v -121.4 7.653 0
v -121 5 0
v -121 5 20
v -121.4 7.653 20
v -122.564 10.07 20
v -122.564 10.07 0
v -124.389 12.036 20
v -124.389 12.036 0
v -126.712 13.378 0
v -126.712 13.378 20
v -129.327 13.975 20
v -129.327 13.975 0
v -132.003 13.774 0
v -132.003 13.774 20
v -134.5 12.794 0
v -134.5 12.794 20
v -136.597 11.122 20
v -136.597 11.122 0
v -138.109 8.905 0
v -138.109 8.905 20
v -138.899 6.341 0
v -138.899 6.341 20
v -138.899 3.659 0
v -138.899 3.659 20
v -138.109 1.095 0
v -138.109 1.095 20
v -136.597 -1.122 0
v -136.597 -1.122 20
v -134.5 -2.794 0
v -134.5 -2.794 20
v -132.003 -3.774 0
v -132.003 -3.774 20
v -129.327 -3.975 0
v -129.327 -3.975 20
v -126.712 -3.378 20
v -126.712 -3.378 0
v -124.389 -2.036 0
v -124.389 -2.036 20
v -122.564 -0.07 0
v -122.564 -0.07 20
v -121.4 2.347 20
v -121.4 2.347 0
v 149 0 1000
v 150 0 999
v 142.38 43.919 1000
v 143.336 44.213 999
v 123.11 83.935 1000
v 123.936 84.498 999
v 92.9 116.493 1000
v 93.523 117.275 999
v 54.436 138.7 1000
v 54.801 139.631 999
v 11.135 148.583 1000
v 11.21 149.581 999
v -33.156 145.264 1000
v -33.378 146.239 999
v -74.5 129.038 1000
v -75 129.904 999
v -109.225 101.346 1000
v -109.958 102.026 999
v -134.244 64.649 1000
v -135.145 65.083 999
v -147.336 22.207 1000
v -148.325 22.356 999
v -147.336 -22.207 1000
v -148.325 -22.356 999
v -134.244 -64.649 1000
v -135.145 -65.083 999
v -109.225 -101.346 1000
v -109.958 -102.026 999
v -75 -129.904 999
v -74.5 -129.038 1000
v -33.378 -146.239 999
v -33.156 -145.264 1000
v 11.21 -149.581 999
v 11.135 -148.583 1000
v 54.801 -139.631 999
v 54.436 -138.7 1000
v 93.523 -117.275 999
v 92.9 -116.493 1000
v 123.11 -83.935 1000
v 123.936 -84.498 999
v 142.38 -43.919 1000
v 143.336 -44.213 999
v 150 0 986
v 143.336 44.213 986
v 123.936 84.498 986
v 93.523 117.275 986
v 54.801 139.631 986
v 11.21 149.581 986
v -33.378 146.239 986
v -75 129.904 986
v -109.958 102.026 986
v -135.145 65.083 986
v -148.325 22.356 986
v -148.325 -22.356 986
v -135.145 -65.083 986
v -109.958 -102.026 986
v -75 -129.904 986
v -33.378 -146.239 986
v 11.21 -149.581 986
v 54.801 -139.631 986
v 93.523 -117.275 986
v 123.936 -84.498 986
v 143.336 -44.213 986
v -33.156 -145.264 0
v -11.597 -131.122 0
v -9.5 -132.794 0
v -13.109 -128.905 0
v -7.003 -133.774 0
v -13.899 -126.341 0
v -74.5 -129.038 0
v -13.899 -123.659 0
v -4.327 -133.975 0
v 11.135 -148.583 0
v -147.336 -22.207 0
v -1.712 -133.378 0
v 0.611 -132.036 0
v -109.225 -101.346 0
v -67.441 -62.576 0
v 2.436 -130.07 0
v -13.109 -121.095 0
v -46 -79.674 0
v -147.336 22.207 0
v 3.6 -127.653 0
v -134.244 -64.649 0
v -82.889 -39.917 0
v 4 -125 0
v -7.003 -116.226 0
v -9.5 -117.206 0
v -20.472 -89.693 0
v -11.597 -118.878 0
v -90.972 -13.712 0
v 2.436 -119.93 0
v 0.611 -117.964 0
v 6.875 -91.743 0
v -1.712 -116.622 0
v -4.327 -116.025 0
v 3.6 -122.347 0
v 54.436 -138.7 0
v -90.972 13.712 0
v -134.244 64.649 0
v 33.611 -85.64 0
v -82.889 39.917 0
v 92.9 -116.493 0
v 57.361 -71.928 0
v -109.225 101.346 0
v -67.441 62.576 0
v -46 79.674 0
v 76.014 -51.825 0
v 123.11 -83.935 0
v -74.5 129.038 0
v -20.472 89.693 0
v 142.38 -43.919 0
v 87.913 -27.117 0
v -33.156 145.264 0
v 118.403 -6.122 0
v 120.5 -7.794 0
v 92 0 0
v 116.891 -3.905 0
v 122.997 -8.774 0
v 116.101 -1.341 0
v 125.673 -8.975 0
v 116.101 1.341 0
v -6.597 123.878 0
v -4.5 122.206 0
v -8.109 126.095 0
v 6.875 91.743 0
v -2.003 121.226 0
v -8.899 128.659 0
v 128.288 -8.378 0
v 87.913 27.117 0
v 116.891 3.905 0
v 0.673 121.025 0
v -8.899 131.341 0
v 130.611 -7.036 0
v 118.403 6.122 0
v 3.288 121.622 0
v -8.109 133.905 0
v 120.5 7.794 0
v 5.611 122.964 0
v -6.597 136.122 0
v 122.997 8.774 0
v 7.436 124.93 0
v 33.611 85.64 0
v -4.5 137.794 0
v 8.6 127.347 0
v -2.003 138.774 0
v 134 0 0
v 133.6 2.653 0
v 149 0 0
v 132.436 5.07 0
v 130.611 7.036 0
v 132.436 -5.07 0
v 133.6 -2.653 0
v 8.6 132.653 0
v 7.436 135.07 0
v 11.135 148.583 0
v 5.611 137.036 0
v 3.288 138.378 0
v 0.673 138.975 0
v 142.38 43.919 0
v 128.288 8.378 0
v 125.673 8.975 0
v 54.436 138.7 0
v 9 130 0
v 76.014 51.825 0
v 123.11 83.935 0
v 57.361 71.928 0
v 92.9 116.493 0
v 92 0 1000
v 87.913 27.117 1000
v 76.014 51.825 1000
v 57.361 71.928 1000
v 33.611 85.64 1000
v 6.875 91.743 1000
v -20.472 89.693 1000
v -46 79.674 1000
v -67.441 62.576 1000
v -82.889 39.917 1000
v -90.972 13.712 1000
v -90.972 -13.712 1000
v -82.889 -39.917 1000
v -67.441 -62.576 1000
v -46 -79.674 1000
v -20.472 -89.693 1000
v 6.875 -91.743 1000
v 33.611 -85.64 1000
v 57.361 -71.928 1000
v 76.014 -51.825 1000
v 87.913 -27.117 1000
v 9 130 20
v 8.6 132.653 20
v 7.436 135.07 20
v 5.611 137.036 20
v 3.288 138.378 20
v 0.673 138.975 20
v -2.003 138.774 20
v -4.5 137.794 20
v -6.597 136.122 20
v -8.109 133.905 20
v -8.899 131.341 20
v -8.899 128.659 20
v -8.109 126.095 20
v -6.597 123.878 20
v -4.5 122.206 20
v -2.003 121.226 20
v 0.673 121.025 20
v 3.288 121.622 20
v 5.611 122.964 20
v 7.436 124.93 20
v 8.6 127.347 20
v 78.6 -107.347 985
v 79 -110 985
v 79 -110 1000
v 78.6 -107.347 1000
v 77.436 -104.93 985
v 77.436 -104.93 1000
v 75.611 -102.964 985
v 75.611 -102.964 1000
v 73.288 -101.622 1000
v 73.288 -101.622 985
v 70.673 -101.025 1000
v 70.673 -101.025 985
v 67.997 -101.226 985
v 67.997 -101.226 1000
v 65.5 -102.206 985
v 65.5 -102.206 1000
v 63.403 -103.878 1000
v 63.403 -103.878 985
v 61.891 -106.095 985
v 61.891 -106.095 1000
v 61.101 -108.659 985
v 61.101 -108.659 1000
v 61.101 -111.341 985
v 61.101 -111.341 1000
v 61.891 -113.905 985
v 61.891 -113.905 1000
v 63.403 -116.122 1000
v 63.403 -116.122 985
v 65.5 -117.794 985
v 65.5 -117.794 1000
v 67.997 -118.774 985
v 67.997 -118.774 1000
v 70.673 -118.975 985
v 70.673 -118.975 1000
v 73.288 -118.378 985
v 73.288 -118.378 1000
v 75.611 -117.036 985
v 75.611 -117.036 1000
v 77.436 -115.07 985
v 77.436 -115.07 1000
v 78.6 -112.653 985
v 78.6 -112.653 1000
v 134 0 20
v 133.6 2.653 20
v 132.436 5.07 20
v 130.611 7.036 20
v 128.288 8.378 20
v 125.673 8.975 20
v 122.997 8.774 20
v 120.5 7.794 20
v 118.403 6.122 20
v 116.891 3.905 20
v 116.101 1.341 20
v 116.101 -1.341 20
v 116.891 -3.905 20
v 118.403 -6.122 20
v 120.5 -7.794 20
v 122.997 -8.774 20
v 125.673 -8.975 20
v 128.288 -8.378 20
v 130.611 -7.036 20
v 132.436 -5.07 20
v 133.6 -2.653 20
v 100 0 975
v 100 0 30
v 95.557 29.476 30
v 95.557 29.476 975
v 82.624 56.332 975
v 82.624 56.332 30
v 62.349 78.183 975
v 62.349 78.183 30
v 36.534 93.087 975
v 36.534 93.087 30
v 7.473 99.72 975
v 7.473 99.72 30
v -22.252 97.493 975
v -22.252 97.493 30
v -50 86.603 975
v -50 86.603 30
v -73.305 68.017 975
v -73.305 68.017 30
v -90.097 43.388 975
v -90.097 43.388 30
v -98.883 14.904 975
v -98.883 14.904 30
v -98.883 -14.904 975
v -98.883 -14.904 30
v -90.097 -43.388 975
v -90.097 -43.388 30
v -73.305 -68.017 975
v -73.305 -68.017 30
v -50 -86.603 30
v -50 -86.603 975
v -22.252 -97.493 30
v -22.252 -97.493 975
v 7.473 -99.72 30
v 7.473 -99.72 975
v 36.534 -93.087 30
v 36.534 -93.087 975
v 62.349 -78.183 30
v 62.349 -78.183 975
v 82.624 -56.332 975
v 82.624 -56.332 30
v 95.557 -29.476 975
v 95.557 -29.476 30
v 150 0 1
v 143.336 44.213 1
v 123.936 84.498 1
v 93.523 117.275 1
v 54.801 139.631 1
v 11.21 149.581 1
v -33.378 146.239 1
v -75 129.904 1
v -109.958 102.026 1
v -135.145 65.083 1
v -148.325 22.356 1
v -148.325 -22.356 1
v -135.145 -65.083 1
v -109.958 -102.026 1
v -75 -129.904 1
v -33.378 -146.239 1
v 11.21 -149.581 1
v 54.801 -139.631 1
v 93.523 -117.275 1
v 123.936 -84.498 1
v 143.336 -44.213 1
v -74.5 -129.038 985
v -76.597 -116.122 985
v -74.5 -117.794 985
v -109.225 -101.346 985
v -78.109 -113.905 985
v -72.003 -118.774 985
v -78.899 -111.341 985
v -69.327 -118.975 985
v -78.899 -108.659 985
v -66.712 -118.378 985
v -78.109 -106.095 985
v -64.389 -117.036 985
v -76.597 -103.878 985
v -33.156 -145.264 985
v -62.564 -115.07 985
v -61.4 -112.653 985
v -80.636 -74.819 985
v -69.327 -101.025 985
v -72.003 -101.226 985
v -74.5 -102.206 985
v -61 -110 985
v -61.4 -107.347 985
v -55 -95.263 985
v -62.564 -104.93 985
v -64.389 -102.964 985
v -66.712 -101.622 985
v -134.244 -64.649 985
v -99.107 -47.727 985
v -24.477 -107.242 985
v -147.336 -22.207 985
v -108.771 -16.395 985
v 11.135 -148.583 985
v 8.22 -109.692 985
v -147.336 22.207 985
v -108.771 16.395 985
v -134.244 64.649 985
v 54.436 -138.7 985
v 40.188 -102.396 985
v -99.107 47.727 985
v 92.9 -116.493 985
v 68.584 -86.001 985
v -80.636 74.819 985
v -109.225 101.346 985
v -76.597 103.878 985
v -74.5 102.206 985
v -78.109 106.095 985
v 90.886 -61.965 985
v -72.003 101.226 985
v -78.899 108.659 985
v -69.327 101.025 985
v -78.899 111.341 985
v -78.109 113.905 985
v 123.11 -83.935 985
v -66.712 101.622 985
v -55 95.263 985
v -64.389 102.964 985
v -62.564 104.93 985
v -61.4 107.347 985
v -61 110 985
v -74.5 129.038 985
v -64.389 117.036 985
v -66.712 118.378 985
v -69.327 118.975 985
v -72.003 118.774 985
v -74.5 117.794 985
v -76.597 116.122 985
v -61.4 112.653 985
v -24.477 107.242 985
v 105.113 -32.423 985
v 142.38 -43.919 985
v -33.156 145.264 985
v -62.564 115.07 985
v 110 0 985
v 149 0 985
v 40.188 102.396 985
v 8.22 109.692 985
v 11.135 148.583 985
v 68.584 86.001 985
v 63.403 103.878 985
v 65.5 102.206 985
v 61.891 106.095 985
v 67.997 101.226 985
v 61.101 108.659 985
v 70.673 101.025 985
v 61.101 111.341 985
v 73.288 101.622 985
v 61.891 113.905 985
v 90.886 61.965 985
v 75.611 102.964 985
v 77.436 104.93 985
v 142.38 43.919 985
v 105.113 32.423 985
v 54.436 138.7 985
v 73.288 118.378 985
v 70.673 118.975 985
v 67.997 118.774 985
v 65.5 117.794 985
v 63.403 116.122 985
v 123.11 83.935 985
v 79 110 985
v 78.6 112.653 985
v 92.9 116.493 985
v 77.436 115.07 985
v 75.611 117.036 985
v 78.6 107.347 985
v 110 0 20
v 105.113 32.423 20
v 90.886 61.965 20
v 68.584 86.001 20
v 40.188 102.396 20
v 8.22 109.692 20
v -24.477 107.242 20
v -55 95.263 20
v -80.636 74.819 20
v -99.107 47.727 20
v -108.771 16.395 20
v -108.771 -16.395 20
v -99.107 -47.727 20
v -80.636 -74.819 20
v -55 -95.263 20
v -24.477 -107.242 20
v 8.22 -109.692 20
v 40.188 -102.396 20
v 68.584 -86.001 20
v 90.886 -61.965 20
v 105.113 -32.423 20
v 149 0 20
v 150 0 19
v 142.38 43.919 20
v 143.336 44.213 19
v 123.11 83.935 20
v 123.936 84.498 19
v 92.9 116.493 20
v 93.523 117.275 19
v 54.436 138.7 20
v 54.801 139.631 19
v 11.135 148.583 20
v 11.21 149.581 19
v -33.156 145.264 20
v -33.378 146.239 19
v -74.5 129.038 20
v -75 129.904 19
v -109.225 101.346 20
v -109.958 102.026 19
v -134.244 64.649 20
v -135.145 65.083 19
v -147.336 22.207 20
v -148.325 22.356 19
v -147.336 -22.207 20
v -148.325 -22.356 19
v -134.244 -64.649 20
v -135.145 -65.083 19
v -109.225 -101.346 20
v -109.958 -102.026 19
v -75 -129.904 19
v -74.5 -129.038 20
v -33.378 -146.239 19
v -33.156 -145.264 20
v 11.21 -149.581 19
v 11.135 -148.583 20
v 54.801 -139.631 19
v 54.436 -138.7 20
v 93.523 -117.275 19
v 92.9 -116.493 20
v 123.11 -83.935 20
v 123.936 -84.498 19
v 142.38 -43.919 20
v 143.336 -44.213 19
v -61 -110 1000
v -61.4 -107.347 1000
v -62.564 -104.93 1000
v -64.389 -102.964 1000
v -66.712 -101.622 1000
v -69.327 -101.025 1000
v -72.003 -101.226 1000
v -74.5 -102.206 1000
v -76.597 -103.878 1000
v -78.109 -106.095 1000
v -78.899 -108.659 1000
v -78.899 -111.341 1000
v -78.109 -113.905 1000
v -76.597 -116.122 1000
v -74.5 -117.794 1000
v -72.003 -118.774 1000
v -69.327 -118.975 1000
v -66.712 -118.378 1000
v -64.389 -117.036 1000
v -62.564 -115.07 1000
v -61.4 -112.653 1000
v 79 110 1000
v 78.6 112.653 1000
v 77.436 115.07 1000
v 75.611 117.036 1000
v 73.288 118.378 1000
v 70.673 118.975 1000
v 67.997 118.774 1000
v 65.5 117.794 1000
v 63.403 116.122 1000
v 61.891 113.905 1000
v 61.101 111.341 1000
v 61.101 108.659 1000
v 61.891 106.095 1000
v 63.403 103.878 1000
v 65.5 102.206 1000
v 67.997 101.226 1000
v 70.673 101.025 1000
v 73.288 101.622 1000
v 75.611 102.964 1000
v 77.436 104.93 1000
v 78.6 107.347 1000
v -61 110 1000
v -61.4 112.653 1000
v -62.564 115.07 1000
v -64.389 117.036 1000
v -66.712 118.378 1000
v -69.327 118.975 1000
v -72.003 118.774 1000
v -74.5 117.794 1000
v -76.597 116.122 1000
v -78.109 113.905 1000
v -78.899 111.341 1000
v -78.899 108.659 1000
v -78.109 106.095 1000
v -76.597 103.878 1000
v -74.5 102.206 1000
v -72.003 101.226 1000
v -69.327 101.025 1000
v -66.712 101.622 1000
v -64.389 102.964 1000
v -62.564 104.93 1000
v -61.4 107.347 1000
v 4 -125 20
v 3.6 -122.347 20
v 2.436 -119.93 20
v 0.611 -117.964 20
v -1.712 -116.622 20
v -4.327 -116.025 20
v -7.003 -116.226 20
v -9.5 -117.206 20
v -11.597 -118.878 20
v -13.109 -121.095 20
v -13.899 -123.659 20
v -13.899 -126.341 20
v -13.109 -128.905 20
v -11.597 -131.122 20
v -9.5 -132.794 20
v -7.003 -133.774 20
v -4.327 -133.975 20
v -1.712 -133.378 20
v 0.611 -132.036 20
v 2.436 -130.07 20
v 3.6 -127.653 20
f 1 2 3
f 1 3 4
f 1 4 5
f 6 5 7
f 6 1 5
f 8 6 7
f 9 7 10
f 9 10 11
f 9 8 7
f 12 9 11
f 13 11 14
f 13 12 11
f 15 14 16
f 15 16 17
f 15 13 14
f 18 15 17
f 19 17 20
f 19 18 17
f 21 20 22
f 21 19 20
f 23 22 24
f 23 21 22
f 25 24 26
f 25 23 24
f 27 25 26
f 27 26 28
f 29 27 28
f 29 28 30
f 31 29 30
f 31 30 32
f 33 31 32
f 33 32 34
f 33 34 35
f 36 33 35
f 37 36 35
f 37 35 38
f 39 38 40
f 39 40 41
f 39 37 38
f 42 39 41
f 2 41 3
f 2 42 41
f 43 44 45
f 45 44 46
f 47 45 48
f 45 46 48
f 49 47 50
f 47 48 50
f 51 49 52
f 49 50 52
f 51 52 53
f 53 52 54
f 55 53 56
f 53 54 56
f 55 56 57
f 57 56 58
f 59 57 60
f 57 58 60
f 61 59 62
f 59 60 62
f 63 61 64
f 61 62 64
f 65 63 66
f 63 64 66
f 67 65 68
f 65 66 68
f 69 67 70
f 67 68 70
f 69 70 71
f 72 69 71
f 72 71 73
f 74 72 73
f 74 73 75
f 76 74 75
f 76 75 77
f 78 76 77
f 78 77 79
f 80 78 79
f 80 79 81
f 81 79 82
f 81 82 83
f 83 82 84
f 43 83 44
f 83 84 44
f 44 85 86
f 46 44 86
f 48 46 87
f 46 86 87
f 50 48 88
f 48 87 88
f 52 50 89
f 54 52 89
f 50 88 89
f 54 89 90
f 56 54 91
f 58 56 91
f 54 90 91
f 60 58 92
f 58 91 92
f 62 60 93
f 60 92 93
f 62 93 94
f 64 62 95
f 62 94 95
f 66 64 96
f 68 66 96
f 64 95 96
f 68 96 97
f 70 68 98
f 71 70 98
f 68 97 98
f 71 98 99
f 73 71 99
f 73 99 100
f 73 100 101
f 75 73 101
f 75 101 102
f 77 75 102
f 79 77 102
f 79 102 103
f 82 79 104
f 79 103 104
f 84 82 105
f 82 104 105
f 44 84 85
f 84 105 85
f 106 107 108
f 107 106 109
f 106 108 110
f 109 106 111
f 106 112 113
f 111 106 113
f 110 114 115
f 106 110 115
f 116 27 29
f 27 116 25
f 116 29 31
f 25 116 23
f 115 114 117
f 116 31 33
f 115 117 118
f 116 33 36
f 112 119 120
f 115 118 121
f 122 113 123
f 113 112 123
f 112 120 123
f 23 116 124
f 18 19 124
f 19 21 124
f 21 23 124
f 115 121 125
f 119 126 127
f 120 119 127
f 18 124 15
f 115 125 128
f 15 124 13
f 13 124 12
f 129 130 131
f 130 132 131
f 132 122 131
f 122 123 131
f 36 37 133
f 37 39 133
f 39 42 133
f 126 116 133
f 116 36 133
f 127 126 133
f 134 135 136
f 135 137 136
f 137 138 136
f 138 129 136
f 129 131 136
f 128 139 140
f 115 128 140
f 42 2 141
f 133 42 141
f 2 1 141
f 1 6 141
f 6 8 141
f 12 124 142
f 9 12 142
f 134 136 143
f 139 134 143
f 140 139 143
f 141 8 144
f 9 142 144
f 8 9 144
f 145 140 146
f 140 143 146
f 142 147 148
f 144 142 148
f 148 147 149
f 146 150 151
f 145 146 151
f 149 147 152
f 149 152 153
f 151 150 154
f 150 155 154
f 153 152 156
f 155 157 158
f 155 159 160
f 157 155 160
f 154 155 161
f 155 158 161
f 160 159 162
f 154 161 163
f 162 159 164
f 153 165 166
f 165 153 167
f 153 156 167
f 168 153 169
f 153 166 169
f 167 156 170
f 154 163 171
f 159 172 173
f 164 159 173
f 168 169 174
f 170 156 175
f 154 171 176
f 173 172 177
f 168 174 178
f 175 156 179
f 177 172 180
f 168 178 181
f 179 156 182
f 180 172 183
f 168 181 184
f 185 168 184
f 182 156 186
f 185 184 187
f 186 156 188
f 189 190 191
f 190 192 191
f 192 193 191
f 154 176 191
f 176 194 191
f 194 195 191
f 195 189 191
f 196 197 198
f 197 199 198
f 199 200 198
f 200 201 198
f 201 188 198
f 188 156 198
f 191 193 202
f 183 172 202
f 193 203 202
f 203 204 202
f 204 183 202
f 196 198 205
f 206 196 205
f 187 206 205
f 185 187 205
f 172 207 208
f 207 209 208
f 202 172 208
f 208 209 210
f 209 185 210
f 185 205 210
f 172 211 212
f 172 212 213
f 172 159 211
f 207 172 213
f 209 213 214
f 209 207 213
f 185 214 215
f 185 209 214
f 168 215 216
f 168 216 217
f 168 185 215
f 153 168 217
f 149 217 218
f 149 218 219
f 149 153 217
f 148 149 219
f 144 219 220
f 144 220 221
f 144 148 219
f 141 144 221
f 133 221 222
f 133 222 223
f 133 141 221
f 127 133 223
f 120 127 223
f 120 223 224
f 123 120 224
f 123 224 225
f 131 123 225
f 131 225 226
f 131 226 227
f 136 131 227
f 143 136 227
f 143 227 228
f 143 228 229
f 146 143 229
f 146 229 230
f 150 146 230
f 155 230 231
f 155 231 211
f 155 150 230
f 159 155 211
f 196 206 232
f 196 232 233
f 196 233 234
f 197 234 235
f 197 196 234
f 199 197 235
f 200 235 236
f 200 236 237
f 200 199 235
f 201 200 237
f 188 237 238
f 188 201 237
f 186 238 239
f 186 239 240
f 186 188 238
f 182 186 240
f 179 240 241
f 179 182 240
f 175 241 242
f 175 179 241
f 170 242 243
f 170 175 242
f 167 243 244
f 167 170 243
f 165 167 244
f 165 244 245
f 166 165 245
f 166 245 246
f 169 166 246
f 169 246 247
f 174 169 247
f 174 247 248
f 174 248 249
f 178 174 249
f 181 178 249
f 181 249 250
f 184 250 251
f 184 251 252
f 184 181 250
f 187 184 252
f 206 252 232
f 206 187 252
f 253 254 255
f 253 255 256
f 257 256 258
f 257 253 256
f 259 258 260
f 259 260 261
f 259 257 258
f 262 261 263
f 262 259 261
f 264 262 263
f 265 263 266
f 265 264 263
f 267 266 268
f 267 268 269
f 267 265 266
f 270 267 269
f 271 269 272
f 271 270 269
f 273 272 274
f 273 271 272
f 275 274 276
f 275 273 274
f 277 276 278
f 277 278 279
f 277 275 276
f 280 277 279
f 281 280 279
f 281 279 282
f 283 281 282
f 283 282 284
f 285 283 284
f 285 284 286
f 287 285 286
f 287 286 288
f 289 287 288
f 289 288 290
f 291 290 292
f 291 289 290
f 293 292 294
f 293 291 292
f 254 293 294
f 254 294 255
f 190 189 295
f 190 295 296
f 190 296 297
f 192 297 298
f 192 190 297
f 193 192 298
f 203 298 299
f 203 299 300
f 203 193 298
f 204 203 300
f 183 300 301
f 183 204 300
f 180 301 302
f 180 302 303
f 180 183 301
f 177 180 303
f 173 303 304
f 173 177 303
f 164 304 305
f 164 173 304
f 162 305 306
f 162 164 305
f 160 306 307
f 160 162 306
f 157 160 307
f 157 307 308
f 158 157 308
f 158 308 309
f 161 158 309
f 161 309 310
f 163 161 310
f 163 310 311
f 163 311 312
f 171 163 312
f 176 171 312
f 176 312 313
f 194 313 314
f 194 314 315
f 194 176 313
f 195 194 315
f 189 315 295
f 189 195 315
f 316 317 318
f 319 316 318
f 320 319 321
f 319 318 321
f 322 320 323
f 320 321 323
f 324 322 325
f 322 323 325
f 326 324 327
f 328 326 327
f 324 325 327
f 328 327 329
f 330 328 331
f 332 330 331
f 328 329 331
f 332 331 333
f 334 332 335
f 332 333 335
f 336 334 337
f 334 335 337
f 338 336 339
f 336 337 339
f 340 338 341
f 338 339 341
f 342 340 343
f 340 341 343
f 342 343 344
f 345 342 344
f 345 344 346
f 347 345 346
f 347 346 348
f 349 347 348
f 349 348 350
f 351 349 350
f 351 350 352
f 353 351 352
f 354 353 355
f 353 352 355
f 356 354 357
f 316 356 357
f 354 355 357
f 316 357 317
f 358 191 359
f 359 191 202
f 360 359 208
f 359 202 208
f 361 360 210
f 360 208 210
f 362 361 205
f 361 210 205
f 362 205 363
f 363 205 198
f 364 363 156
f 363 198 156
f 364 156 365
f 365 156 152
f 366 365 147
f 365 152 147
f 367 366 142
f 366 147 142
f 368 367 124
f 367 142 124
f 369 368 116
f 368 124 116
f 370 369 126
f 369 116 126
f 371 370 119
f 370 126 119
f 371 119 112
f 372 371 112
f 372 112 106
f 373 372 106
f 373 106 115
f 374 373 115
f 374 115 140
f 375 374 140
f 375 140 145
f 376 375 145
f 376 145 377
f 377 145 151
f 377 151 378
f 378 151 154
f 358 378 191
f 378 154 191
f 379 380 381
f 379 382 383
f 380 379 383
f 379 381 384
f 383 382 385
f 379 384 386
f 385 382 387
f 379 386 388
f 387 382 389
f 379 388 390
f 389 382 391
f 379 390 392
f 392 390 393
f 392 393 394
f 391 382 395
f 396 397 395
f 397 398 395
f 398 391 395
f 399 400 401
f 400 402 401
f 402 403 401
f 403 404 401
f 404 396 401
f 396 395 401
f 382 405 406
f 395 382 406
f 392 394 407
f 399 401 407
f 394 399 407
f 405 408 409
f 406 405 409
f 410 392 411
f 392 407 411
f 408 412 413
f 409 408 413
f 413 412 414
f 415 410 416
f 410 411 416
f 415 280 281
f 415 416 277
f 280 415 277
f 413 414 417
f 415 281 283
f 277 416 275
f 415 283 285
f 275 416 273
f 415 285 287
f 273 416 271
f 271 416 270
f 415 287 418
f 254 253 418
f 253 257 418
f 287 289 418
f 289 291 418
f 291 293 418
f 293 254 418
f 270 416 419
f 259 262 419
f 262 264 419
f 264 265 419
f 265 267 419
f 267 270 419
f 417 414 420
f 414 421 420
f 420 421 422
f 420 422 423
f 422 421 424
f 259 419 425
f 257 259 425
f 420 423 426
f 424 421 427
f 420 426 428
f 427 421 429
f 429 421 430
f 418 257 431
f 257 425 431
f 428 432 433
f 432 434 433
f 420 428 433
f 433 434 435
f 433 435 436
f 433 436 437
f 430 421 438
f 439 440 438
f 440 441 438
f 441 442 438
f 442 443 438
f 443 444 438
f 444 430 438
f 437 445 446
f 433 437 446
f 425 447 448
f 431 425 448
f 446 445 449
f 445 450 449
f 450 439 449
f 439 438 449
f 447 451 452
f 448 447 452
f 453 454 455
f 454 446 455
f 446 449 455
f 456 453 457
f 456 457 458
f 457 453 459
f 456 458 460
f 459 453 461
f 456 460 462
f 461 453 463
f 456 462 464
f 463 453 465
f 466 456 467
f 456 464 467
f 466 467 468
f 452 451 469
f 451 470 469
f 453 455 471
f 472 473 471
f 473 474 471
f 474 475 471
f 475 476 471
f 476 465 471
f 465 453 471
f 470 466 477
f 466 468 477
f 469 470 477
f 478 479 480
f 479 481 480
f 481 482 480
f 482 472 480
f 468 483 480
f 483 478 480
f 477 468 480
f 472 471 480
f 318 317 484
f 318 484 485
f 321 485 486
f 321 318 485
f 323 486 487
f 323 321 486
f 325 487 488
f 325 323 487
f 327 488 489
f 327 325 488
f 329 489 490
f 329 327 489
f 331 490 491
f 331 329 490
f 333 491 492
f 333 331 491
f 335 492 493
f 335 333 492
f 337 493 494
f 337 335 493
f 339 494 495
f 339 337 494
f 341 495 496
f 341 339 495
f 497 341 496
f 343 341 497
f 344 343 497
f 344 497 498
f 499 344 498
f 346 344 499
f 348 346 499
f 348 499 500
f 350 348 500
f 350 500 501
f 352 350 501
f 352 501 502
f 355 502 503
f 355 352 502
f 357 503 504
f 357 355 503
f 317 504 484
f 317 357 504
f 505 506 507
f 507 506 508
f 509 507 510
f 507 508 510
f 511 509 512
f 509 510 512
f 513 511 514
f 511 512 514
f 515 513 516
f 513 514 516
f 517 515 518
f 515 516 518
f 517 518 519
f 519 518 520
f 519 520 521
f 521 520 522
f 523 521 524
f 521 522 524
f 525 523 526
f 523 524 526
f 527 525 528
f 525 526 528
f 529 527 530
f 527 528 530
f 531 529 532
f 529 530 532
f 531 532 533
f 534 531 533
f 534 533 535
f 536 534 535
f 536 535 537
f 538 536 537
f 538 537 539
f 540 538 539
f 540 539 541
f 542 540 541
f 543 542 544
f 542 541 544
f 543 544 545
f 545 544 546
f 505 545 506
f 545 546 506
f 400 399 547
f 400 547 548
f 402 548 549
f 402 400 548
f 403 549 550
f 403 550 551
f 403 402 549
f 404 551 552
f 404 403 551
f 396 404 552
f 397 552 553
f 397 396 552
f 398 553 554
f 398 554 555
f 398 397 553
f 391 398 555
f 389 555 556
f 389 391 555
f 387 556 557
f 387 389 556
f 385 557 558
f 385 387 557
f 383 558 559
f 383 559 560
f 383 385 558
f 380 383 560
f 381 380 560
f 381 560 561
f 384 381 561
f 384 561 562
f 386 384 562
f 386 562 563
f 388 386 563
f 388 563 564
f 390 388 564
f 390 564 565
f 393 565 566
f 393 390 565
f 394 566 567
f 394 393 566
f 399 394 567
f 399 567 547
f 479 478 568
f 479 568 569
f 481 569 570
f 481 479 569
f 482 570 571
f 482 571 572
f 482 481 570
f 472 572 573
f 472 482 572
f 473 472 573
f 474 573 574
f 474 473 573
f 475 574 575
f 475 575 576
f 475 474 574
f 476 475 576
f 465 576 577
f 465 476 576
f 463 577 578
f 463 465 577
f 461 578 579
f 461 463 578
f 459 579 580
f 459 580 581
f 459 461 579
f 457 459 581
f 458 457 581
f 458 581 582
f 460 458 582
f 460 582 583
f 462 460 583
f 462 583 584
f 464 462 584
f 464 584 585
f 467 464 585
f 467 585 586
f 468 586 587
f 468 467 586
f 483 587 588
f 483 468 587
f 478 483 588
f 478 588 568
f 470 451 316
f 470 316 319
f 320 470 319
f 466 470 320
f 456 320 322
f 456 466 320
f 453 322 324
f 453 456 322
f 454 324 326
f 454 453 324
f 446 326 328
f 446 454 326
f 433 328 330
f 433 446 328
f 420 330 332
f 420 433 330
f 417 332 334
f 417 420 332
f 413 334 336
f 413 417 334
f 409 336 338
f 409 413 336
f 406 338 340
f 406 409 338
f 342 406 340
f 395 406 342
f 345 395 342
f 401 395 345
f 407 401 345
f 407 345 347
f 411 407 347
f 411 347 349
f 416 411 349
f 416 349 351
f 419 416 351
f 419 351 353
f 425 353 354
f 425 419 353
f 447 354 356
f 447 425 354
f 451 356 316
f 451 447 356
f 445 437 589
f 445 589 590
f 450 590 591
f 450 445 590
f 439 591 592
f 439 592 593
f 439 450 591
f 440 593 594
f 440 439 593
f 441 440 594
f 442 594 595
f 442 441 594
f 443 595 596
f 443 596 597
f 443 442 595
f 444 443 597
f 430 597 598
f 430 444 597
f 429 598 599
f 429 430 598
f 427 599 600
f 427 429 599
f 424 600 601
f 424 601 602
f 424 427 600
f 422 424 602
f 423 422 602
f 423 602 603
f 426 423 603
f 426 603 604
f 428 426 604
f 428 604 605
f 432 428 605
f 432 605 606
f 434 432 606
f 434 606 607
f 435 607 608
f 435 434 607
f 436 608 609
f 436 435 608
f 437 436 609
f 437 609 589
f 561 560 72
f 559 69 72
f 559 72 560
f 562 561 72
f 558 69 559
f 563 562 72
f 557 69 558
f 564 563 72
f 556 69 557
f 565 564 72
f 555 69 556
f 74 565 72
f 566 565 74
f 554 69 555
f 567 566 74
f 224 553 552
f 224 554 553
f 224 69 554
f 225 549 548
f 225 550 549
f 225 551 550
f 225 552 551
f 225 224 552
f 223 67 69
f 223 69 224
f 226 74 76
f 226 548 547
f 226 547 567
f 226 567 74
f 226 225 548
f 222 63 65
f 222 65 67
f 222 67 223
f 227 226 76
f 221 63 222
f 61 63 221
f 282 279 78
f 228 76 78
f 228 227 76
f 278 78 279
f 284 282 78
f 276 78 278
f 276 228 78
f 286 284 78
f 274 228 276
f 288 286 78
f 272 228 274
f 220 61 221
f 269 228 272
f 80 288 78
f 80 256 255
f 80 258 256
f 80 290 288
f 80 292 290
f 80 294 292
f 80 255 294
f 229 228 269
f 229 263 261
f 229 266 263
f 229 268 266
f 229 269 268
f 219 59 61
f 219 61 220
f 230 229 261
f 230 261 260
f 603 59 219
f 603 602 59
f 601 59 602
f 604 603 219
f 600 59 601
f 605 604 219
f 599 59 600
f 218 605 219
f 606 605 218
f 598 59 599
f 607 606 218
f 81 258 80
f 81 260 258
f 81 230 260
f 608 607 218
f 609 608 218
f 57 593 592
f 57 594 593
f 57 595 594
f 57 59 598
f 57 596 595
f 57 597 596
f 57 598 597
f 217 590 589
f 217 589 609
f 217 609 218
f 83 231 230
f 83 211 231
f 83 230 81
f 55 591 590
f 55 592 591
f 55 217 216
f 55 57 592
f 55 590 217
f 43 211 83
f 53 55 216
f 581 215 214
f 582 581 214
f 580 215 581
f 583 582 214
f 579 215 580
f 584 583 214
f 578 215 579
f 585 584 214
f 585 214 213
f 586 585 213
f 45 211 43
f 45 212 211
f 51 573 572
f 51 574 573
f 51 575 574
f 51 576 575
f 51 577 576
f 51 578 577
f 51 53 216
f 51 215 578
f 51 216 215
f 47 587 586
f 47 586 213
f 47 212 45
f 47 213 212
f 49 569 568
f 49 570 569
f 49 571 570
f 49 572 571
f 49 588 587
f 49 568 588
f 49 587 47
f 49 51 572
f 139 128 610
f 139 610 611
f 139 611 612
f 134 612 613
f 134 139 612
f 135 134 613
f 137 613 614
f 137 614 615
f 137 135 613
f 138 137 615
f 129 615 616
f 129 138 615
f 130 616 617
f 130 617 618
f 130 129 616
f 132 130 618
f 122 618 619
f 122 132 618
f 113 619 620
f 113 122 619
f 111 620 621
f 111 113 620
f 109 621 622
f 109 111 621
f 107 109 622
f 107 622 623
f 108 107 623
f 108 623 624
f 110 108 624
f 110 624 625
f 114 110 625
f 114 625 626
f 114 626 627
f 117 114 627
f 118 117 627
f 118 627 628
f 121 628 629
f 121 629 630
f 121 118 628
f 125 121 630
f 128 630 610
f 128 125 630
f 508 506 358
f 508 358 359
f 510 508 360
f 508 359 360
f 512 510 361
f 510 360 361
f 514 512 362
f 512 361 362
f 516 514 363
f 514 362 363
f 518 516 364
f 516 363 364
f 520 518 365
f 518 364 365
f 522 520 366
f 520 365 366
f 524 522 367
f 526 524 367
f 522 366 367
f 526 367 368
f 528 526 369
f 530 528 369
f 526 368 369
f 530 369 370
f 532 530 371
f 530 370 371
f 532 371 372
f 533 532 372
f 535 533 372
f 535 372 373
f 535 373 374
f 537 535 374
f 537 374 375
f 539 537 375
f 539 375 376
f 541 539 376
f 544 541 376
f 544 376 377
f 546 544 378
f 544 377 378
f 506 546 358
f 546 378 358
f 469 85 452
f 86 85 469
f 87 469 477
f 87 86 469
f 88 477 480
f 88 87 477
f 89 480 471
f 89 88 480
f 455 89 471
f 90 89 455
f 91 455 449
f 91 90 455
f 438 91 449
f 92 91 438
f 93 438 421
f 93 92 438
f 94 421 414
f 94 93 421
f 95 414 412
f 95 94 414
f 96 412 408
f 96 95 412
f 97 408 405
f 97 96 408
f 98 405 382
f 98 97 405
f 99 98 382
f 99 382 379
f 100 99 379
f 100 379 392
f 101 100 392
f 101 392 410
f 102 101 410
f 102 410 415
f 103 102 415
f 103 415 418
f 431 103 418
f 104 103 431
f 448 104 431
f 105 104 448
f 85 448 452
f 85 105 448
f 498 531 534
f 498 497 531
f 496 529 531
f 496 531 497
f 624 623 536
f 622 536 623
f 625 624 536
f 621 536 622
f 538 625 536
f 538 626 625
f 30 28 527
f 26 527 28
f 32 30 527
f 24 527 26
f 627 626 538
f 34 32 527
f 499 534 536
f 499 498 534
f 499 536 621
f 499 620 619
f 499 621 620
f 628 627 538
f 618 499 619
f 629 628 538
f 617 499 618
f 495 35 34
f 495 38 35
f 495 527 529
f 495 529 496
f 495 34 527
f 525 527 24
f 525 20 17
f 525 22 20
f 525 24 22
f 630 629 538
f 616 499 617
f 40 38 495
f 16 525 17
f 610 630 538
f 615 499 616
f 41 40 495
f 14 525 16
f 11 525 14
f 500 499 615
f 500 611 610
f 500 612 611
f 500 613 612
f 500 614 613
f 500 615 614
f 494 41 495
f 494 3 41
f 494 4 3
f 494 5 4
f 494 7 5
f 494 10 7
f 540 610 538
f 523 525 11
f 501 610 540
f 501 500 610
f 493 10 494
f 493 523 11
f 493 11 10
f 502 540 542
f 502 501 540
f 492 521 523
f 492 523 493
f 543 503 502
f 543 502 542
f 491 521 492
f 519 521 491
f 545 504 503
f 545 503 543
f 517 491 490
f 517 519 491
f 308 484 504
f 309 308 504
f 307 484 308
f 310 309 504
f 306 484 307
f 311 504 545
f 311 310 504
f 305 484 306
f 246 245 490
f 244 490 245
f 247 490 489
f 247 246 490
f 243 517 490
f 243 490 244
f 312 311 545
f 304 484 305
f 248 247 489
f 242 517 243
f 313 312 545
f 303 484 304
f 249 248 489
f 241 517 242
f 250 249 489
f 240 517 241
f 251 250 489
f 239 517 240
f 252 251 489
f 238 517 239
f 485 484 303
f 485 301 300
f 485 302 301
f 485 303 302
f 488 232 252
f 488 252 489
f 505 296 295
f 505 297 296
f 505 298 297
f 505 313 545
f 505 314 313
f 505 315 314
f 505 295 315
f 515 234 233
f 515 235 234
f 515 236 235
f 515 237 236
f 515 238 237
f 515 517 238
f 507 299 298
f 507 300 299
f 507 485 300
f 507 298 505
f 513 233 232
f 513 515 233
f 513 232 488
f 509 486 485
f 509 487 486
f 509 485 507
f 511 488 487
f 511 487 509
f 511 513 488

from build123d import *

# Parameters (mm, degrees)
SKIZZE1_R                       = 150
SKIZZE1_R_2                     = 92
SKIZZE1_R_3                     = 9
AUFSATZ_LINEAR_AUSTRAGEN1_DEPTH = 20
SKIZZE2_R                       = 100
SKIZZE2_R_2                     = 92
AUFSATZ_LINEAR_AUSTRAGEN2_DEPTH = 965
SKIZZE3_R                       = 150
SKIZZE3_R_2                     = 92
SKIZZE3_R_3                     = 9
AUFSATZ_LINEAR_AUSTRAGEN3_DEPTH = 15
FASE1_SIZE                      = 10
FASE2_SIZE                      = 1


with BuildPart() as part:
    # Skizze1 → Aufsatz-Linear austragen1 (new body)
    with BuildSketch(Plane.XY):
        Circle(SKIZZE1_R)
        Circle(SKIZZE1_R_2, mode=Mode.SUBTRACT)
        with Locations((0, 130)):
            Circle(SKIZZE1_R_3, mode=Mode.SUBTRACT)
        with Locations((125, 0)):
            Circle(SKIZZE1_R_3, mode=Mode.SUBTRACT)
        with Locations((-5, -125)):
            Circle(SKIZZE1_R_3, mode=Mode.SUBTRACT)
        with Locations((-130, 5)):
            Circle(SKIZZE1_R_3, mode=Mode.SUBTRACT)
    extrude(amount=AUFSATZ_LINEAR_AUSTRAGEN1_DEPTH)

    # Skizze2 → Aufsatz-Linear austragen2 (add)
    with BuildSketch(Plane.XY.offset(20)):
        Circle(SKIZZE2_R)
        Circle(SKIZZE2_R_2, mode=Mode.SUBTRACT)
    extrude(amount=AUFSATZ_LINEAR_AUSTRAGEN2_DEPTH)

    # Skizze3 → Aufsatz-Linear austragen3 (add)
    with BuildSketch(Plane.XY.offset(985)):
        Circle(SKIZZE3_R)
        Circle(SKIZZE3_R_2, mode=Mode.SUBTRACT)
        with Locations((-70, 110)):
            Circle(SKIZZE3_R_3, mode=Mode.SUBTRACT)
        with Locations((70, 110)):
            Circle(SKIZZE3_R_3, mode=Mode.SUBTRACT)
        with Locations((70, -110)):
            Circle(SKIZZE3_R_3, mode=Mode.SUBTRACT)
        with Locations((-70, -110)):
            Circle(SKIZZE3_R_3, mode=Mode.SUBTRACT)
    extrude(amount=AUFSATZ_LINEAR_AUSTRAGEN3_DEPTH)

    # Fase1
    fase1_edges = [part.edges().sort_by_distance(p)[0] for p in [
        (-100, 0, 985),
        (-100, 0, 20),
    ]]
    chamfer(fase1_edges, length=FASE1_SIZE)

    # Fase2
    fase2_edges = [part.edges().sort_by_distance(p)[0] for p in [
        (-150, 0, 0),
        (-150, 0, 1000),
        (-150, 0, 985),
        (-150, 0, 20),
    ]]
    chamfer(fase2_edges, length=FASE2_SIZE)


solid = part.part
